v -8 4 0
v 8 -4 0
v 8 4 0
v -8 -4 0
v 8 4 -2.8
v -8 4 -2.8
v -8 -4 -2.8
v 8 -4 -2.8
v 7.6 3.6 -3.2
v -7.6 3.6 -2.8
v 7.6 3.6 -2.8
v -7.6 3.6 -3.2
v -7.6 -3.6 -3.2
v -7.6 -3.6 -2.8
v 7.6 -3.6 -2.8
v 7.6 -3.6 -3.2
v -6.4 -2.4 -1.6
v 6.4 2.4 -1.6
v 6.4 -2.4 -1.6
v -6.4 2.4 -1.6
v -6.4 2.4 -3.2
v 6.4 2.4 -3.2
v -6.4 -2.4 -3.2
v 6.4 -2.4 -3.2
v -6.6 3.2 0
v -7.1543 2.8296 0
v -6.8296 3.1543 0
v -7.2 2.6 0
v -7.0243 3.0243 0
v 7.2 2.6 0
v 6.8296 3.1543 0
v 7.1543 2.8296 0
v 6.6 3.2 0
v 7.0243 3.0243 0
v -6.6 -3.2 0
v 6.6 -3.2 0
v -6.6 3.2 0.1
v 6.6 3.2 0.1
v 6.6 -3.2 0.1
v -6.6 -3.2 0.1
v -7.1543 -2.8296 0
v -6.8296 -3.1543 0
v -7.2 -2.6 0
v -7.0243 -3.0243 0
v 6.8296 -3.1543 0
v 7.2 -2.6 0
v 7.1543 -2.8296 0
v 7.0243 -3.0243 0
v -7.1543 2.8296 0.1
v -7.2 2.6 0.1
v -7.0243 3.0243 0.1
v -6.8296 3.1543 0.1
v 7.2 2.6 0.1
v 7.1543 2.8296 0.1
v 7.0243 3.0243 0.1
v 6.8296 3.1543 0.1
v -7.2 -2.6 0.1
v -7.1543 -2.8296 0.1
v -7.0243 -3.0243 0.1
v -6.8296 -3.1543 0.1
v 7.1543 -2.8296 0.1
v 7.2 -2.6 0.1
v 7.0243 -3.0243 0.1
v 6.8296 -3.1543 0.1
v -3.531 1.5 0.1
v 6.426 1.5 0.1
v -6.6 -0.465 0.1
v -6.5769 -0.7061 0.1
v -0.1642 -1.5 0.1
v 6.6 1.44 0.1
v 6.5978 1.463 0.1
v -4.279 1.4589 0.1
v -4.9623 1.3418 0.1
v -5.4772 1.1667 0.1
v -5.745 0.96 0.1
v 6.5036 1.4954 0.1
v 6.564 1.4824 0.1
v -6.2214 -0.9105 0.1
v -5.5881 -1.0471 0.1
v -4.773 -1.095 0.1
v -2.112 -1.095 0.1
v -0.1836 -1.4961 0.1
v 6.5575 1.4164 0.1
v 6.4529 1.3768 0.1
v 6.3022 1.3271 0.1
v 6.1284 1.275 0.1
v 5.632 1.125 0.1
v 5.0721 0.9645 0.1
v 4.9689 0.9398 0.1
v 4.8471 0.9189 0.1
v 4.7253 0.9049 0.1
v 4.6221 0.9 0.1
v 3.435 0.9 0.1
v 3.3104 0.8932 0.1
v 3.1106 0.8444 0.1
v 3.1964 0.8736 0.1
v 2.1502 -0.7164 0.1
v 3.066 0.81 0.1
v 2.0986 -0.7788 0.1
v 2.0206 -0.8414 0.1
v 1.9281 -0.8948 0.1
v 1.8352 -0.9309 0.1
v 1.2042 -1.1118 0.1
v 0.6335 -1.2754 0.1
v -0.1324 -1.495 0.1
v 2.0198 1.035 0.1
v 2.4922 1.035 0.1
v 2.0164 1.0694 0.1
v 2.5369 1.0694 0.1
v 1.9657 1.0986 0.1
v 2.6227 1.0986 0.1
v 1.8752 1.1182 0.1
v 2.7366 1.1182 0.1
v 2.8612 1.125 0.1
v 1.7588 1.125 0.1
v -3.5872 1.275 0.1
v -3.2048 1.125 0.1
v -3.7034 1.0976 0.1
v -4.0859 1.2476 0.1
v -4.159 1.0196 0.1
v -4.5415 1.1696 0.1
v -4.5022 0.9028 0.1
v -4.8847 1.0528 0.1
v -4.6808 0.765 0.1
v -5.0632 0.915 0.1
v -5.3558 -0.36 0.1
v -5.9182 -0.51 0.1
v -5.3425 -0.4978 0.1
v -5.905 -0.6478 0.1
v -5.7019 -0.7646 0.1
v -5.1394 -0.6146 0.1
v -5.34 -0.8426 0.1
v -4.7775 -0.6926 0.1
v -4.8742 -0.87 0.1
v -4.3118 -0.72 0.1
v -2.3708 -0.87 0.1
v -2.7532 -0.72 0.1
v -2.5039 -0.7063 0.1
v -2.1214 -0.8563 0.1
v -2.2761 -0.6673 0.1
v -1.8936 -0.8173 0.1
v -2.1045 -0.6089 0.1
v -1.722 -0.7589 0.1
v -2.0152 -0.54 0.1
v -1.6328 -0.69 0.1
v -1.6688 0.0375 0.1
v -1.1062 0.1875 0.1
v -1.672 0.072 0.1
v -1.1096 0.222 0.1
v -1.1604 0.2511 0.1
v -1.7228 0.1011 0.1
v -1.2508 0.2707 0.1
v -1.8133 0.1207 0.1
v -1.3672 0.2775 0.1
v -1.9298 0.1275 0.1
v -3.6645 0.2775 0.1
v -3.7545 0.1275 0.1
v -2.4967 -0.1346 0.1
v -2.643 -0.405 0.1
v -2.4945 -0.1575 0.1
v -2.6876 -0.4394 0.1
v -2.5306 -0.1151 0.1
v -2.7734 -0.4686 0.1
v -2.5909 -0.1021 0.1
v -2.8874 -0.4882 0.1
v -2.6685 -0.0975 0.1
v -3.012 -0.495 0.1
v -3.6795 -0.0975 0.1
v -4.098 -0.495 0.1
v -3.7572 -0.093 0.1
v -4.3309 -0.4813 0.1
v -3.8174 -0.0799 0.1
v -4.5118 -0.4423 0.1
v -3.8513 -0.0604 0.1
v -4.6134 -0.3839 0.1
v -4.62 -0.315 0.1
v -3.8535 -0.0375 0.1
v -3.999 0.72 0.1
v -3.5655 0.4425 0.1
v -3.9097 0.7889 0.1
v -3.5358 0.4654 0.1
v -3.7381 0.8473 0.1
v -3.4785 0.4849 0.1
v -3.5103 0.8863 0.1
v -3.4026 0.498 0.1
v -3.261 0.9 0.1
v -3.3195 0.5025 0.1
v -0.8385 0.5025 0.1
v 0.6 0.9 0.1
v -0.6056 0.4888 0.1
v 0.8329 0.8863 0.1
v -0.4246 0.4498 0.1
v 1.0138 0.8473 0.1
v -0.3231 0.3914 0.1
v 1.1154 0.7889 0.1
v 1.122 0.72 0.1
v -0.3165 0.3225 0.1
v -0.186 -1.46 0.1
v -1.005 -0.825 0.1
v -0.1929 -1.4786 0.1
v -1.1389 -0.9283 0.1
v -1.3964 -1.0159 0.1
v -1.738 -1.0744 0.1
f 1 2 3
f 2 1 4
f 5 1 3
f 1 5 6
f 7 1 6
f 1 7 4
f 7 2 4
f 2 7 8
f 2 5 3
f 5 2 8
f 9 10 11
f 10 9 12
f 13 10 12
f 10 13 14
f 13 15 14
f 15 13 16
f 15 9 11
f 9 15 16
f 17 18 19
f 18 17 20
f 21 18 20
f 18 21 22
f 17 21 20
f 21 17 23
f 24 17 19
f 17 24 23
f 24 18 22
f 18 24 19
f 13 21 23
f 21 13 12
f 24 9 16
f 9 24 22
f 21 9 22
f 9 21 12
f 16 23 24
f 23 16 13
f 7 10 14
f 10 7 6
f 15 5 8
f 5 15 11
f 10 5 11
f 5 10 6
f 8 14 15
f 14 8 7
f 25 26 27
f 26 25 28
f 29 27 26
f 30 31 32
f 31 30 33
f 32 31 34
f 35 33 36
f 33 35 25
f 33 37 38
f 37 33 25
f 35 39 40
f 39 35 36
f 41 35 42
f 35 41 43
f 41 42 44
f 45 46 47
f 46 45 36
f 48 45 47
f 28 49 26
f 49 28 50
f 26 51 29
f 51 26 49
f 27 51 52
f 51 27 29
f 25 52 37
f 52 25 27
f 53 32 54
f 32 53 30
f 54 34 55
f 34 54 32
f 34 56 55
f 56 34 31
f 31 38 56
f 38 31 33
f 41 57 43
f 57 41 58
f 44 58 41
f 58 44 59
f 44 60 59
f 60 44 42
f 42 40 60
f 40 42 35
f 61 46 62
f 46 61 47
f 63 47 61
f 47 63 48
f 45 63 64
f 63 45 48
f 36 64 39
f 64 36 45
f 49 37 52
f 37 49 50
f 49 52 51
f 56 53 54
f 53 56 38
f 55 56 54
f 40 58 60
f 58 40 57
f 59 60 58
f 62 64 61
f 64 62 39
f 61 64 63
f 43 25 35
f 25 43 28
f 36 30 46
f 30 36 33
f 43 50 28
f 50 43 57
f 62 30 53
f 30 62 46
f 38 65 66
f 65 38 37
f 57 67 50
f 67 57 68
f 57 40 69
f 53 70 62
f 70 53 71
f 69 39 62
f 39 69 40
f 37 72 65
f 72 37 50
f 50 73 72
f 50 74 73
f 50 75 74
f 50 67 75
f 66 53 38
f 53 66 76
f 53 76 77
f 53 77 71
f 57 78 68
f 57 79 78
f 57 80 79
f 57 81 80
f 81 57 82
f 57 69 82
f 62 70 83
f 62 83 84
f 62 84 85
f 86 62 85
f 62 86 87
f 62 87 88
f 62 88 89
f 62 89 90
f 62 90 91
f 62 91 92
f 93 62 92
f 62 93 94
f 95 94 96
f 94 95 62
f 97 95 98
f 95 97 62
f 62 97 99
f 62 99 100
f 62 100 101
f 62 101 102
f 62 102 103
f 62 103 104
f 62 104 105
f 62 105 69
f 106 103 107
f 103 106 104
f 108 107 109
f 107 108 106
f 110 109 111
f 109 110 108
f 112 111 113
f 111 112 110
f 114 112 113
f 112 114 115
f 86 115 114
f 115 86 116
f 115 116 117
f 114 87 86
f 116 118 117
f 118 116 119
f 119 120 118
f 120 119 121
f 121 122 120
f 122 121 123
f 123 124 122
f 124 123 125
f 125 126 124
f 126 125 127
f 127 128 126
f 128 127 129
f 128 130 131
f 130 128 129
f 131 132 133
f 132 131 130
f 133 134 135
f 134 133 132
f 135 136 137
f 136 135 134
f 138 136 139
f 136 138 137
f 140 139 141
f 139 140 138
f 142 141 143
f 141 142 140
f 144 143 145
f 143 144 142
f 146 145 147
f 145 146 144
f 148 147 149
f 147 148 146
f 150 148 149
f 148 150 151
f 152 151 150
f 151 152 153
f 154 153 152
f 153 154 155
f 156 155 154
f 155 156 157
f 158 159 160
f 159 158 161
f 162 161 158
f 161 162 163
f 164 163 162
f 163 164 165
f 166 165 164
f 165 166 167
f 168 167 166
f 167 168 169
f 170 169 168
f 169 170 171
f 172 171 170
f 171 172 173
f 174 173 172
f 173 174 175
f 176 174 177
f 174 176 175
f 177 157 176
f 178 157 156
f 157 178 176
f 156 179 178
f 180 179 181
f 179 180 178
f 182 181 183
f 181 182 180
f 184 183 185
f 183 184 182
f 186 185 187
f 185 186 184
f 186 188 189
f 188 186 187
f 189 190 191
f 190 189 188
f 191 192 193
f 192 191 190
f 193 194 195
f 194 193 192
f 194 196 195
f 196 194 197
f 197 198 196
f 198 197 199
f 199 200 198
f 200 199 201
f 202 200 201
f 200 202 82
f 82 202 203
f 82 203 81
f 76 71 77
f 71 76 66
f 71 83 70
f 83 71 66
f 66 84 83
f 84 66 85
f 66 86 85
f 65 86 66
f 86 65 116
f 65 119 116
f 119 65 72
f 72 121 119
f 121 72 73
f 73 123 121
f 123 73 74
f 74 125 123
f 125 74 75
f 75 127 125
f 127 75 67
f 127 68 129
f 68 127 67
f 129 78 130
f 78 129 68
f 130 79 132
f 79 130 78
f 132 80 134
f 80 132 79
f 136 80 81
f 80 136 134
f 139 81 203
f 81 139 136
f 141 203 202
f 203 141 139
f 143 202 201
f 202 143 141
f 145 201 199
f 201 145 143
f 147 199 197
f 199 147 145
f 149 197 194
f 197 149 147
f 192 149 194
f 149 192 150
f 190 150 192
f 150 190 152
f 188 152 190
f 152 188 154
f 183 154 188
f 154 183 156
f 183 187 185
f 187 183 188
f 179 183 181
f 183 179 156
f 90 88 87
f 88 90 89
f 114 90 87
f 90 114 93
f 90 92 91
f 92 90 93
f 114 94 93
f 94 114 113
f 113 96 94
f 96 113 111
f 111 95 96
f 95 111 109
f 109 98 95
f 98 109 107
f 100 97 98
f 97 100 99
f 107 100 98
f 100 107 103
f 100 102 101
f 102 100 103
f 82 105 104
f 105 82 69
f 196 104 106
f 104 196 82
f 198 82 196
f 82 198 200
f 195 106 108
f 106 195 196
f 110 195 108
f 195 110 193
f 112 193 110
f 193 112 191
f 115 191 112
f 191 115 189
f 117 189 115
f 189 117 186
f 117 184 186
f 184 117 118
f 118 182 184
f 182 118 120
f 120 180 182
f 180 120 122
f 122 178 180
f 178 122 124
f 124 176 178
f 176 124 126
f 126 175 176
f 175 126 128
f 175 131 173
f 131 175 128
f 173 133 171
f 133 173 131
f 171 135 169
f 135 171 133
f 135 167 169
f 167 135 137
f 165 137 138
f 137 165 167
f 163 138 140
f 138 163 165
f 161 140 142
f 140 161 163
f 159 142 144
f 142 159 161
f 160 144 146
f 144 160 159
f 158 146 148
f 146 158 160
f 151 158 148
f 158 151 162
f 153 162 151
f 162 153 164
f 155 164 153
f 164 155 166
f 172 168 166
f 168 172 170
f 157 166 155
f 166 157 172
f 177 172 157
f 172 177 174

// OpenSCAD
// file: ../p/box5.scad
use <../lib.scad>
function ldraw_lib__box5() = [
// 0 Box with 5 Faces and All Edges
// 0 Name: box5.dat
// 0 Author: James Jessiman
// 0 !LDRAW_ORG Primitive UPDATE 2012-01
// 0 !LICENSE Licensed under CC BY 4.0 : see CAreadme.txt
// 
// 0 BFC CERTIFY CCW
  [0,"BFC","CERTIFY"],
  [0,"BFC","CCW"],
// 
// 0 !HISTORY 2002-04-03 [sbliss] Modified for BFC compliance
// 0 !HISTORY 2002-04-25 [PTadmin] Official Update 2002-02
// 0 !HISTORY 2007-06-24 [PTadmin] Header formatted for Contributor Agreement
// 0 !HISTORY 2008-07-01 [PTadmin] Official Update 2008-01
// 0 !HISTORY 2012-02-16 [Philo] Changed to CCW
// 0 !HISTORY 2012-03-30 [PTadmin] Official Update 2012-01
// 
// 
// 2 24 1 1 1 -1 1 1
  [2,24,1,1,1,-1,1,1],
// 2 24 -1 1 1 -1 1 -1
  [2,24,-1,1,1,-1,1,-1],
// 2 24 -1 1 -1 1 1 -1
  [2,24,-1,1,-1,1,1,-1],
// 2 24 1 1 -1 1 1 1
  [2,24,1,1,-1,1,1,1],
// 2 24 1 0 1 -1 0 1
  [2,24,1,0,1,-1,0,1],
// 2 24 -1 0 1 -1 0 -1
  [2,24,-1,0,1,-1,0,-1],
// 2 24 -1 0 -1 1 0 -1
  [2,24,-1,0,-1,1,0,-1],
// 2 24 1 0 -1 1 0 1
  [2,24,1,0,-1,1,0,1],
// 2 24 1 0 1 1 1 1
  [2,24,1,0,1,1,1,1],
// 2 24 -1 0 1 -1 1 1
  [2,24,-1,0,1,-1,1,1],
// 2 24 1 0 -1 1 1 -1
  [2,24,1,0,-1,1,1,-1],
// 2 24 -1 0 -1 -1 1 -1
  [2,24,-1,0,-1,-1,1,-1],
// 4 16 -1 1 1 1 1 1 1 1 -1 -1 1 -1
  [4,16,-1,1,1,1,1,1,1,1,-1,-1,1,-1],
// 4 16 -1 1 1 -1 0 1 1 0 1 1 1 1
  [4,16,-1,1,1,-1,0,1,1,0,1,1,1,1],
// 4 16 -1 1 -1 -1 0 -1 -1 0 1 -1 1 1
  [4,16,-1,1,-1,-1,0,-1,-1,0,1,-1,1,1],
// 4 16 1 1 -1 1 0 -1 -1 0 -1 -1 1 -1
  [4,16,1,1,-1,1,0,-1,-1,0,-1,-1,1,-1],
// 4 16 1 1 1 1 0 1 1 0 -1 1 1 -1
  [4,16,1,1,1,1,0,1,1,0,-1,1,1,-1],
];
module ldraw_lib__box5(step=0, col=false, unit=2/5, alt=false, line=0.2, solid=!$preview)
    makepoly(ldraw_lib__box5(), step=step, col=col, unit=unit, alt=alt, line=line, solid=solid);
ldraw_lib__box5(line=0.2);
// file: ../p/box4.scad
use <../lib.scad>
function ldraw_lib__box4() = [
// 0 Box with 4 Faces (2 Parallel Pairs) and All Edges
// 0 Name: box4.dat
// 0 Author: James Jessiman
// 0 !LDRAW_ORG Primitive UPDATE 2012-01
// 0 !LICENSE Licensed under CC BY 4.0 : see CAreadme.txt
// 
// 0 BFC CERTIFY CCW
  [0,"BFC","CERTIFY"],
  [0,"BFC","CCW"],
// 
// 0 !HISTORY 2002-04-03 [sbliss] Modified for BFC compliance
// 0 !HISTORY 2002-04-25 [PTadmin] Official Update 2002-02
// 0 !HISTORY 2007-06-24 [PTadmin] Header formatted for Contributor Agreement
// 0 !HISTORY 2008-07-01 [PTadmin] Official Update 2008-01
// 0 !HISTORY 2012-02-16 [Philo] Changed to CCW
// 0 !HISTORY 2012-03-30 [PTadmin] Official Update 2012-01
// 
// 
// 2 24 1 1 1 -1 1 1
  [2,24,1,1,1,-1,1,1],
// 2 24 -1 1 1 -1 1 -1
  [2,24,-1,1,1,-1,1,-1],
// 2 24 -1 1 -1 1 1 -1
  [2,24,-1,1,-1,1,1,-1],
// 2 24 1 1 -1 1 1 1
  [2,24,1,1,-1,1,1,1],
// 2 24 1 0 1 -1 0 1
  [2,24,1,0,1,-1,0,1],
// 2 24 -1 0 1 -1 0 -1
  [2,24,-1,0,1,-1,0,-1],
// 2 24 -1 0 -1 1 0 -1
  [2,24,-1,0,-1,1,0,-1],
// 2 24 1 0 -1 1 0 1
  [2,24,1,0,-1,1,0,1],
// 2 24 1 0 1 1 1 1
  [2,24,1,0,1,1,1,1],
// 2 24 -1 0 1 -1 1 1
  [2,24,-1,0,1,-1,1,1],
// 2 24 1 0 -1 1 1 -1
  [2,24,1,0,-1,1,1,-1],
// 2 24 -1 0 -1 -1 1 -1
  [2,24,-1,0,-1,-1,1,-1],
// 4 16 -1 1 1 -1 0 1 1 0 1 1 1 1
  [4,16,-1,1,1,-1,0,1,1,0,1,1,1,1],
// 4 16 -1 1 -1 -1 0 -1 -1 0 1 -1 1 1
  [4,16,-1,1,-1,-1,0,-1,-1,0,1,-1,1,1],
// 4 16 1 1 -1 1 0 -1 -1 0 -1 -1 1 -1
  [4,16,1,1,-1,1,0,-1,-1,0,-1,-1,1,-1],
// 4 16 1 1 1 1 0 1 1 0 -1 1 1 -1
  [4,16,1,1,1,1,0,1,1,0,-1,1,1,-1],
];
module ldraw_lib__box4(step=0, col=false, unit=2/5, alt=false, line=0.2, solid=!$preview)
    makepoly(ldraw_lib__box4(), step=step, col=col, unit=unit, alt=alt, line=line, solid=solid);
ldraw_lib__box4(line=0.2);
// file: ../p/box3u12.scad
use <../lib.scad>
function ldraw_lib__box3u12() = [
// 0 Box with 3 Parallel Faces without Any Edges
// 0 Name: box3u12.dat
// 0 Author: J.C. Tchang [tchang]
// 0 !LDRAW_ORG Primitive UPDATE 2014-02
// 0 !LICENSE Licensed under CC BY 4.0 : see CAreadme.txt
// 
// 0 BFC CERTIFY CCW
  [0,"BFC","CERTIFY"],
  [0,"BFC","CCW"],
// 
// 0 !HISTORY 2014-12-23 [PTadmin] Official Update 2014-02
// 
// 
// 4 16 -1 1 1 1 1 1 1 1 -1 -1 1 -1
  [4,16,-1,1,1,1,1,1,1,1,-1,-1,1,-1],
// 4 16 -1 1 1 -1 0 1 1 0 1 1 1 1
  [4,16,-1,1,1,-1,0,1,1,0,1,1,1,1],
// 4 16 1 1 -1 1 0 -1 -1 0 -1 -1 1 -1
  [4,16,1,1,-1,1,0,-1,-1,0,-1,-1,1,-1],
];
module ldraw_lib__box3u12(step=0, col=false, unit=2/5, alt=false, line=0.2, solid=!$preview)
    makepoly(ldraw_lib__box3u12(), step=step, col=col, unit=unit, alt=alt, line=line, solid=solid);
ldraw_lib__box3u12(line=0.2);
// file: ../p/1-4cyli.scad
use <../lib.scad>
function ldraw_lib__1_4cyli() = [
// 0 Cylinder 0.25
// 0 Name: 1-4cyli.dat
// 0 Author: James Jessiman
// 0 !LDRAW_ORG Primitive UPDATE 2012-01
// 0 !LICENSE Licensed under CC BY 4.0 : see CAreadme.txt
// 
// 0 BFC CERTIFY CCW
  [0,"BFC","CERTIFY"],
  [0,"BFC","CCW"],
// 
// 0 !HISTORY 2002-03-23 [sbliss] Added BFC statement.
// 0 !HISTORY 2002-04-25 [PTadmin] Official Update 2002-02
// 0 !HISTORY 2007-06-22 [PTadmin] Header formatted for Contributor Agreement
// 0 !HISTORY 2008-07-01 [PTadmin] Official Update 2008-01
// 0 !HISTORY 2012-02-16 [Philo] Changed to CCW
// 0 !HISTORY 2012-03-30 [PTadmin] Official Update 2012-01
// 
// 
// 4 16 1 1 0 0.9239 1 0.3827 0.9239 0 0.3827 1 0 0
  [4,16,1,1,0,0.9239,1,0.3827,0.9239,0,0.3827,1,0,0],
// 5 24 1 0 0 1 1 0 0.9239 0 0.3827 1 0 -1
  [5,24,1,0,0,1,1,0,0.9239,0,0.3827,1,0,-1],
// 4 16 0.9239 1 0.3827 0.7071 1 0.7071 0.7071 0 0.7071 0.9239 0 0.3827
  [4,16,0.9239,1,0.3827,0.7071,1,0.7071,0.7071,0,0.7071,0.9239,0,0.3827],
// 5 24 0.9239 0 0.3827 0.9239 1 0.3827 0.7071 0 0.7071 1 0 0
  [5,24,0.9239,0,0.3827,0.9239,1,0.3827,0.7071,0,0.7071,1,0,0],
// 4 16 0.7071 1 0.7071 0.3827 1 0.9239 0.3827 0 0.9239 0.7071 0 0.7071
  [4,16,0.7071,1,0.7071,0.3827,1,0.9239,0.3827,0,0.9239,0.7071,0,0.7071],
// 5 24 0.7071 0 0.7071 0.7071 1 0.7071 0.3827 0 0.9239 0.9239 0 0.3827
  [5,24,0.7071,0,0.7071,0.7071,1,0.7071,0.3827,0,0.9239,0.9239,0,0.3827],
// 4 16 0.3827 1 0.9239 0 1 1 0 0 1 0.3827 0 0.9239
  [4,16,0.3827,1,0.9239,0,1,1,0,0,1,0.3827,0,0.9239],
// 5 24 0.3827 0 0.9239 0.3827 1 0.9239 0 0 1 0.7071 0 0.7071
  [5,24,0.3827,0,0.9239,0.3827,1,0.9239,0,0,1,0.7071,0,0.7071],
// 5 24 0 0 1 0 1 1 0.3827 0 0.9239 -1 0 1
  [5,24,0,0,1,0,1,1,0.3827,0,0.9239,-1,0,1],
];
module ldraw_lib__1_4cyli(step=0, col=false, unit=2/5, alt=false, line=0.2, solid=!$preview)
    makepoly(ldraw_lib__1_4cyli(), step=step, col=col, unit=unit, alt=alt, line=line, solid=solid);
ldraw_lib__1_4cyli(line=0.2);
// file: ../p/1-4chrd.scad
use <../lib.scad>
function ldraw_lib__1_4chrd() = [
// 0 Chord 0.25
// 0 Name: 1-4chrd.dat
// 0 Author: Max Martin Richter [MMR1988]
// 0 !LDRAW_ORG Primitive UPDATE 2023-05
// 0 !LICENSE Licensed under CC BY 4.0 : see CAreadme.txt
// 
// 0 BFC CERTIFY CCW
  [0,"BFC","CERTIFY"],
  [0,"BFC","CCW"],
// 
// 0 !HISTORY 2004-04-22 [PTadmin] Official Update 2004-02
// 0 !HISTORY 2007-10-09 [PTadmin] Header formatted for Contributor Agreement
// 0 !HISTORY 2008-07-01 [PTadmin] Official Update 2008-01
// 0 !HISTORY 2012-08-02 [MMR1988] Re-creation with PrimGen2 and Rectifier
// 0 !HISTORY 2012-08-09 [PTadmin] Official Update 2012-02
// 0 !HISTORY 2023-10-27 [OrionP] Change author to MMR1988 from hafhead
// 0 !HISTORY 2023-10-31 [OrionP] Official Update 2023-05
// 
// 4 16 0.9239 0 0.3827 0.3827 0 0.9239 0 0 1 1 0 0
  [4,16,0.9239,0,0.3827,0.3827,0,0.9239,0,0,1,1,0,0],
// 3 16 0.7071 0 0.7071 0.3827 0 0.9239 0.9239 0 0.3827
  [3,16,0.7071,0,0.7071,0.3827,0,0.9239,0.9239,0,0.3827],
];
module ldraw_lib__1_4chrd(step=0, col=false, unit=2/5, alt=false, line=0.2, solid=!$preview)
    makepoly(ldraw_lib__1_4chrd(), step=step, col=col, unit=unit, alt=alt, line=line, solid=solid);
ldraw_lib__1_4chrd(line=0.2);
// file: s/3069bs01.scad
use <../../lib.scad>
use <../../p/box4.scad>
use <../../p/box5.scad>
function ldraw_lib__s__3069bs01() = [
// 0 ~Tile  1 x  2 with Groove without Top Face
// 0 Name: s\3069bs01.dat
// 0 Author: Santeri Piippo [arezey]
// 0 !LDRAW_ORG Subpart UPDATE 2010-02
// 0 !LICENSE Licensed under CC BY 4.0 : see CAreadme.txt
// 
// 0 BFC CERTIFY CCW
  [0,"BFC","CERTIFY"],
  [0,"BFC","CCW"],
// 
// 0 !HISTORY 2010-07-05 [PTadmin] Official Update 2010-02
// 
// 
// 1 16 0 0 0 20 0 0 0 7 0 0 0 10 box4.dat
  [1,16,0,0,0,20,0,0,0,7,0,0,0,10, ldraw_lib__box4()],
// 1 16 0 7 0 19 0 0 0 1 0 0 0 9 box4.dat
  [1,16,0,7,0,19,0,0,0,1,0,0,0,9, ldraw_lib__box4()],
// 0 BFC INVERTNEXT
  [0,"BFC","INVERTNEXT"],
// 1 16 0 8 0 16 0 0 0 -4 0 0 0 6 box5.dat
  [1,16,0,8,0,16,0,0,0,-4,0,0,0,6, ldraw_lib__box5()],
// 4 16 -19 8 9 -16 8 6 -16 8 -6 -19 8 -9
  [4,16,-19,8,9,-16,8,6,-16,8,-6,-19,8,-9],
// 4 16 19 8 -9 16 8 -6 16 8 6 19 8 9
  [4,16,19,8,-9,16,8,-6,16,8,6,19,8,9],
// 4 16 19 8 9 16 8 6 -16 8 6 -19 8 9
  [4,16,19,8,9,16,8,6,-16,8,6,-19,8,9],
// 4 16 -19 8 -9 -16 8 -6 16 8 -6 19 8 -9
  [4,16,-19,8,-9,-16,8,-6,16,8,-6,19,8,-9],
// 4 16 -20 7 10 -19 7 9 -19 7 -9 -20 7 -10
  [4,16,-20,7,10,-19,7,9,-19,7,-9,-20,7,-10],
// 4 16 20 7 -10 19 7 -9 19 7 9 20 7 10
  [4,16,20,7,-10,19,7,-9,19,7,9,20,7,10],
// 4 16 20 7 10 19 7 9 -19 7 9 -20 7 10
  [4,16,20,7,10,19,7,9,-19,7,9,-20,7,10],
// 4 16 -20 7 -10 -19 7 -9 19 7 -9 20 7 -10
  [4,16,-20,7,-10,-19,7,-9,19,7,-9,20,7,-10],
// 0 //
];
module ldraw_lib__s__3069bs01(step=0, col=false, unit=2/5, alt=false, line=0.2, solid=!$preview)
    makepoly(ldraw_lib__s__3069bs01(), step=step, col=col, unit=unit, alt=alt, line=line, solid=solid);
ldraw_lib__s__3069bs01(line=0.2);
// file: 3069b.scad
use <../lib.scad>
use <s/3069bs01.scad>
function ldraw_lib__3069b() = [
// 0 Tile  1 x  2 with Groove
// 0 Name: 3069b.dat
// 0 Author: Santeri Piippo [arezey]
// 0 !LDRAW_ORG Part UPDATE 2010-02
// 0 !LICENSE Licensed under CC BY 4.0 : see CAreadme.txt
// 
// 0 BFC CERTIFY CCW
  [0,"BFC","CERTIFY"],
  [0,"BFC","CCW"],
// 
// 0 !KEYWORDS BrickLink 3069
// 
// 0 !HISTORY 2010-07-05 [PTadmin] Official Update 2010-02
// 
// 
// 4 16 20 0 -10 20 0 10 -20 0 10 -20 0 -10
  [4,16,20,0,-10,20,0,10,-20,0,10,-20,0,-10],
// 1 16 0 0 0 1 0 0 0 1 0 0 0 1 s\3069bs01.dat
  [1,16,0,0,0,1,0,0,0,1,0,0,0,1, ldraw_lib__s__3069bs01()],
// 0 //
];
module ldraw_lib__3069b(step=0, col=false, unit=2/5, alt=false, line=0.2, solid=!$preview)
    makepoly(ldraw_lib__3069b(), step=step, col=col, unit=unit, alt=alt, line=line, solid=solid);
ldraw_lib__3069b(line=0.2);
// main file
use <../lib.scad>
use <3069b.scad>
use <6177969s.scad>
function ldraw_lib__3069bd2l() = [
// 0 Tile  1 x  2 with White GT Logo on Red Background Sticker
// 0 Name: 3069bd2l.dat
// 0 Author: Alfred Schmitz [AlfredS]
// 0 !LDRAW_ORG Shortcut UPDATE 2026-09
// 0 !LICENSE Licensed under CC BY 4.0 : see CAreadme.txt
// 
// 0 BFC CERTIFY CCW
  [0,"BFC","CERTIFY"],
  [0,"BFC","CCW"],
// 
// 0 !CATEGORY Sticker Shortcut
// 0 !KEYWORDS Ford, GT, Set 75881, Speed Champions
// 
// 0 !HISTORY 2026-09-30 [OrionP] Official Update 2026-09
// 
// 1 16 0 0 0 1 0 0 0 1 0 0 0 1 3069b.dat
  [1,16,0,0,0,1,0,0,0,1,0,0,0,1, ldraw_lib__3069b()],
// 1 16 0 0 0 1 0 0 0 1 0 0 0 1 6177969s.dat
  [1,16,0,0,0,1,0,0,0,1,0,0,0,1, ldraw_lib__6177969s()],
];
module ldraw_lib__3069bd2l(step=0, col=false, unit=2/5, alt=false, line=0.2, solid=!$preview)
    makepoly(ldraw_lib__3069bd2l(), step=step, col=col, unit=unit, alt=alt, line=line, solid=solid);
ldraw_lib__3069bd2l(line=0.2);
